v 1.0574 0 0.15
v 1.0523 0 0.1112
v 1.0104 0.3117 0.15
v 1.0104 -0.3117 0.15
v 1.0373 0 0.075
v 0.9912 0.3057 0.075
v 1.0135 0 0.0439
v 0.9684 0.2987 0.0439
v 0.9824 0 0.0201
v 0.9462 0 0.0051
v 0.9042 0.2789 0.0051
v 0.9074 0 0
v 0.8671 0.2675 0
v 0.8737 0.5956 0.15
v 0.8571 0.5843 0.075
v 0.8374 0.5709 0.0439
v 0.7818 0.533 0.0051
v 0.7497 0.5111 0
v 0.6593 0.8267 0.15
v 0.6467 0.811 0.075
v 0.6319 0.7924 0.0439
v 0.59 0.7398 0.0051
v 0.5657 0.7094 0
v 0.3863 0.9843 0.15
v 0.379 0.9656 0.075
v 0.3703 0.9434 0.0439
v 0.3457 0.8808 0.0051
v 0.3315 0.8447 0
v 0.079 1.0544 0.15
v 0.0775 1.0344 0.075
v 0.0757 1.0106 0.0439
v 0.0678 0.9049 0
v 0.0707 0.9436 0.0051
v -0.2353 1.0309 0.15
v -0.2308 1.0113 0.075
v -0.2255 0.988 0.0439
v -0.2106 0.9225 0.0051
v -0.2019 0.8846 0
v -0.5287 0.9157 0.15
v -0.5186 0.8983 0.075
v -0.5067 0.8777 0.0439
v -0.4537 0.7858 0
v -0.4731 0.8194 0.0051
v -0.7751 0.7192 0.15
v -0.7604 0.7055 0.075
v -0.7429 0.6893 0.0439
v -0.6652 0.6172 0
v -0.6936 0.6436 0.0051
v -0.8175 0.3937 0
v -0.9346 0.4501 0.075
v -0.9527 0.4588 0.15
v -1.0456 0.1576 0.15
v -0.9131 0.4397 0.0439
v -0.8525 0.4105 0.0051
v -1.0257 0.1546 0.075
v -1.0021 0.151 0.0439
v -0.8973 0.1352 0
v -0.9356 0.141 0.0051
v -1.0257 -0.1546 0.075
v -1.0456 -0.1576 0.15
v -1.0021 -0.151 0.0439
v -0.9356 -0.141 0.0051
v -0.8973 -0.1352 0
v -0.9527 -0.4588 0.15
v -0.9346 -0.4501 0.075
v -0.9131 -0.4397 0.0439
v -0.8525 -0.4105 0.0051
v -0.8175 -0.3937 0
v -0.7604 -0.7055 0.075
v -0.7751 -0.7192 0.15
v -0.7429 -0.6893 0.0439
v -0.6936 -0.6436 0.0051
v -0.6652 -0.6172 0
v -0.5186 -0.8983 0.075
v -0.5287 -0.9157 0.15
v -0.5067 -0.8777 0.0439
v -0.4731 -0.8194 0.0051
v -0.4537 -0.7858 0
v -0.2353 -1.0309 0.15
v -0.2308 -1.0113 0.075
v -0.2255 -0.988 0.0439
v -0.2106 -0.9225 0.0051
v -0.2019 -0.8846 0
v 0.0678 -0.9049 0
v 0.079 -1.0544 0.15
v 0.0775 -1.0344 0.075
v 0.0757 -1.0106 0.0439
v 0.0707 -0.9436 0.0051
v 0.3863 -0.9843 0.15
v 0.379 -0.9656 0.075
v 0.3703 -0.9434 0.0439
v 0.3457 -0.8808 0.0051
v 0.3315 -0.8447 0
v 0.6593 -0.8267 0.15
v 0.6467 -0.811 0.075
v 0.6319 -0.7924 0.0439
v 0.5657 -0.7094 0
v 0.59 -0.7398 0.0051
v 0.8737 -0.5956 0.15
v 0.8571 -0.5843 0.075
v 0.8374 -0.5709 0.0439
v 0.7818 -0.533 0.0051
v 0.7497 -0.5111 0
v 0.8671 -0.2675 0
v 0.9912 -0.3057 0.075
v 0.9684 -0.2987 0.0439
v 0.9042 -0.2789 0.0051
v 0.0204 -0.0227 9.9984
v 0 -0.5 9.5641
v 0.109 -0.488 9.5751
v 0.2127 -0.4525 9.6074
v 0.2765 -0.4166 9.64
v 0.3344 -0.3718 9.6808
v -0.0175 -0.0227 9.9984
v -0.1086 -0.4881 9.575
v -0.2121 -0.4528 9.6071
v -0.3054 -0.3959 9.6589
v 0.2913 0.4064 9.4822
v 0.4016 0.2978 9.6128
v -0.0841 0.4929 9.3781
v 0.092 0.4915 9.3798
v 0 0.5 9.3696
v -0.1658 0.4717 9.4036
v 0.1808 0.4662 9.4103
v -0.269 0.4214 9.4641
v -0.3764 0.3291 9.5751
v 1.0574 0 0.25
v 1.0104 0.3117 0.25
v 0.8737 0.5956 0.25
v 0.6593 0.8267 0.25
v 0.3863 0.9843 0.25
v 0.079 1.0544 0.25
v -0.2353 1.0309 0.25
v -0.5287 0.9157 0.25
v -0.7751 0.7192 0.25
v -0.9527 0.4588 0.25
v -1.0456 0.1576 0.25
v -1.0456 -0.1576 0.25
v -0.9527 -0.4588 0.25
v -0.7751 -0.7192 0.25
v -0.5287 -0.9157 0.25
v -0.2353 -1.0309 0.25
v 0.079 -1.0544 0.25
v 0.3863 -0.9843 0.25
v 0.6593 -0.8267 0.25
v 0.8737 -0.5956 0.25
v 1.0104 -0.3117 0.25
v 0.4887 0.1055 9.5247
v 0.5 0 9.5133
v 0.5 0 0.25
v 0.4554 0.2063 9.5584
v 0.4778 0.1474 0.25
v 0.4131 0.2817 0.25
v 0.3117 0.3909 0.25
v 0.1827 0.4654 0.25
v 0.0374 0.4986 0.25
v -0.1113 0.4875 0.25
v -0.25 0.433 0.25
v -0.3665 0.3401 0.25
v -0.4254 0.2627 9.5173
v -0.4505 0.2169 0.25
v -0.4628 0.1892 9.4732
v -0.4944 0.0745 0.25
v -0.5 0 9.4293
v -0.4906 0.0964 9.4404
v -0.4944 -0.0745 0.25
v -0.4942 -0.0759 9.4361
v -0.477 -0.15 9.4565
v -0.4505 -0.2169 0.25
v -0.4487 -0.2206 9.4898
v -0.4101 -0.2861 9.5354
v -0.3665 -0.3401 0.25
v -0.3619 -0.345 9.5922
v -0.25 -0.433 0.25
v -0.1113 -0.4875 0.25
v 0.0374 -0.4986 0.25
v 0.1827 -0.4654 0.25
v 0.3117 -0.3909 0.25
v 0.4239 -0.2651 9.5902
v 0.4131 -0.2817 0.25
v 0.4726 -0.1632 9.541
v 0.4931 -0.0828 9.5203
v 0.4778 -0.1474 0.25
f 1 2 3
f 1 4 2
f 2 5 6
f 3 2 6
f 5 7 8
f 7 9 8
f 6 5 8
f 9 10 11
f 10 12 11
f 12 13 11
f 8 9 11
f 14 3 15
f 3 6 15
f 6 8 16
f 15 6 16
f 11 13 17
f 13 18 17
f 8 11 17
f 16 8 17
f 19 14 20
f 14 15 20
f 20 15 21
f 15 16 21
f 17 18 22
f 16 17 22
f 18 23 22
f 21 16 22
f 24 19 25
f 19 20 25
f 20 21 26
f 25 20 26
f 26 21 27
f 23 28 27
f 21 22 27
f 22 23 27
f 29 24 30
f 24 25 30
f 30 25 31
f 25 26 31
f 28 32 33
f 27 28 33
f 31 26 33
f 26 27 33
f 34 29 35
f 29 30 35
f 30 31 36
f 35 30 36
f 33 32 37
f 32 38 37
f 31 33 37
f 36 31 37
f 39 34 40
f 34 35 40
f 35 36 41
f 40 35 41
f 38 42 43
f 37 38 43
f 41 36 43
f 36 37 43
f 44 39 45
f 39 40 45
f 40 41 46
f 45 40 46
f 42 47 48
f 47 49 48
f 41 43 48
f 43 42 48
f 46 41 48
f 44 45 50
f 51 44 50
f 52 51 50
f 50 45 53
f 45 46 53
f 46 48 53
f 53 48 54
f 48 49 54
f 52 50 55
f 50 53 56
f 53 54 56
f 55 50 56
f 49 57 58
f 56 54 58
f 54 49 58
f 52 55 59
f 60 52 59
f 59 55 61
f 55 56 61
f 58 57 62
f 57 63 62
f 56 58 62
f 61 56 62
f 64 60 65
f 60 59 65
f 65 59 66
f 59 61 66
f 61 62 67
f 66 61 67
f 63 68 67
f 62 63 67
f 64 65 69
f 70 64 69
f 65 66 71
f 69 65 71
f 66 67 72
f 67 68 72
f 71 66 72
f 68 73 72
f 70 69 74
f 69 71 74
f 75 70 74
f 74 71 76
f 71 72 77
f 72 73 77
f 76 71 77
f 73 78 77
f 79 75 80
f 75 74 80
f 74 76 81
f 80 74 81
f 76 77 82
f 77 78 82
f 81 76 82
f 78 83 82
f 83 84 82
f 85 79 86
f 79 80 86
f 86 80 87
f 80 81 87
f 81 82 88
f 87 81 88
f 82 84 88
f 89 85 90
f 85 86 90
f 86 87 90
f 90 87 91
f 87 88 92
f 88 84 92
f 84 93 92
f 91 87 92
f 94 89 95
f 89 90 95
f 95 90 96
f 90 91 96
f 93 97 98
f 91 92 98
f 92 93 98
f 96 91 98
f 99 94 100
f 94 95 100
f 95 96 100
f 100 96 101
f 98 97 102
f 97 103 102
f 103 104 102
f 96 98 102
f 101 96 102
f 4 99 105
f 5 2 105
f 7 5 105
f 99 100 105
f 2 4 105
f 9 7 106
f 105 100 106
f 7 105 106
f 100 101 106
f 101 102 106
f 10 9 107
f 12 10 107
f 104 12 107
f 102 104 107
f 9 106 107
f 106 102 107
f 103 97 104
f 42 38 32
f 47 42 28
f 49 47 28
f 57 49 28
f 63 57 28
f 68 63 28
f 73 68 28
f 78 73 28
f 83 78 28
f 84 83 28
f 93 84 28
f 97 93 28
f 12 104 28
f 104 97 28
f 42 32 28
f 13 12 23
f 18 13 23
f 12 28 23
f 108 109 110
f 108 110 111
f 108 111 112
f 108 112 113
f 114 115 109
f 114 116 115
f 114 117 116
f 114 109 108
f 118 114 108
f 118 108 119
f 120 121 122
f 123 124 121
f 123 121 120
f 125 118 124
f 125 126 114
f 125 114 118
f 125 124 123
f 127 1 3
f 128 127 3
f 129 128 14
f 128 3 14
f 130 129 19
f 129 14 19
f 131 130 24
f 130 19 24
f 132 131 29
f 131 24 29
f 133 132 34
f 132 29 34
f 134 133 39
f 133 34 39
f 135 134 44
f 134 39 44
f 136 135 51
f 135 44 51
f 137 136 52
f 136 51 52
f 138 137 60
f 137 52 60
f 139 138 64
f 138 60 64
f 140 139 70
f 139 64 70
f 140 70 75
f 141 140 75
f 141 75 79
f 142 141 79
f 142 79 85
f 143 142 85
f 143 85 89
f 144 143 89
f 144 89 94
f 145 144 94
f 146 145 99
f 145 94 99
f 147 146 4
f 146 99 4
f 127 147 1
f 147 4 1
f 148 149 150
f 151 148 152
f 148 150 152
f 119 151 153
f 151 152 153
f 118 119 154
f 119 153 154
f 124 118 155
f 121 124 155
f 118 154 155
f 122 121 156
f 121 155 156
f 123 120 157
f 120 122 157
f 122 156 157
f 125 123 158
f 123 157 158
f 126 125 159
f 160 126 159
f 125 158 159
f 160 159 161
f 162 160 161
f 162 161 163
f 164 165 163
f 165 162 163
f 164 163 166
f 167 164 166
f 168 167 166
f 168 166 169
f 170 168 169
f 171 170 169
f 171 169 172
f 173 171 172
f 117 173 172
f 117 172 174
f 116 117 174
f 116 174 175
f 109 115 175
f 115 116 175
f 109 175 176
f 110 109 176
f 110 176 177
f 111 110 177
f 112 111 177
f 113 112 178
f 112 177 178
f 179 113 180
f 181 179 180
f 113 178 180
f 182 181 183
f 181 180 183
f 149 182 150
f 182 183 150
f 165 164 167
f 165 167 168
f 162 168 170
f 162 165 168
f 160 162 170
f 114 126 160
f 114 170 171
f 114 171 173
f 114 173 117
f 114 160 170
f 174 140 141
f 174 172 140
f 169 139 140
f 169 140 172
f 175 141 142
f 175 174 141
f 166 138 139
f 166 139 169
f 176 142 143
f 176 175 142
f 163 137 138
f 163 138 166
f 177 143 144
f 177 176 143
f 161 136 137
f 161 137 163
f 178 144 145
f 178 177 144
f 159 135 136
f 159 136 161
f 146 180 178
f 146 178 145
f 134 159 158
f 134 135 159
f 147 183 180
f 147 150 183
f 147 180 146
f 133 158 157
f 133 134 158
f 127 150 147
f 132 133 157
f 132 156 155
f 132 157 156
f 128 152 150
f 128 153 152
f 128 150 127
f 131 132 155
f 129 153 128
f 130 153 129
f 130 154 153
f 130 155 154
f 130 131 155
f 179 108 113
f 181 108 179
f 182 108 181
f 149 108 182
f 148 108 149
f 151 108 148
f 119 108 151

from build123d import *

# Parameters (mm, degrees)
F0_R          = 0.5
F1_DEPTH      = 10
F0_R_2        = 1.057388
F2_DEPTH      = 0.25
F3_R          = 0.15
F5_DEPTH      = 25
F5_DEPTH_BACK = 25
F7_DEPTH      = 25
F7_DEPTH_BACK = 25


with BuildPart() as f1:
    # F0 (on Top) → F1 (new body)
    with BuildSketch(Plane.XY):
        Circle(F0_R)
    extrude(amount=F1_DEPTH)

    # F0 (on Top) → F2 (join)
    with BuildSketch(Plane.XY):
        Circle(F0_R_2)
        Circle(F0_R, mode=Mode.SUBTRACT)
    extrude(amount=F2_DEPTH)

    # F3
    f3_edges = [f1.edges().sort_by_distance(p)[0] for p in [
        (-1.057388, 0, 0),
    ]]
    fillet(f3_edges, radius=F3_R)

    # F4 (on Right) → F5 (cut, two sides)
    with BuildSketch(Plane.YZ) as f5_sk:
        Polygon((-0.958076, 9.147321), (-0.022735, 9.998414), (0.690646, 9.140222), (0.690646, 10.352595), (-0.869291, 10.392135), align=None)
    extrude(amount=F5_DEPTH, mode=Mode.SUBTRACT)
    extrude(f5_sk.sketch, amount=-F5_DEPTH_BACK, mode=Mode.SUBTRACT)

    # F6 (on Front) → F7 (cut, two sides)
    with BuildSketch(Plane.XZ) as f7_sk:
        Polygon((-1.2872, 8.500885), (0, 10.019018), (1.330554, 8.673213), (1.125401, 10.741157), (-1.2872, 10.741157), align=None)
    extrude(amount=F7_DEPTH, mode=Mode.SUBTRACT)
    extrude(f7_sk.sketch, amount=-F7_DEPTH_BACK, mode=Mode.SUBTRACT)


solid = f1.part
